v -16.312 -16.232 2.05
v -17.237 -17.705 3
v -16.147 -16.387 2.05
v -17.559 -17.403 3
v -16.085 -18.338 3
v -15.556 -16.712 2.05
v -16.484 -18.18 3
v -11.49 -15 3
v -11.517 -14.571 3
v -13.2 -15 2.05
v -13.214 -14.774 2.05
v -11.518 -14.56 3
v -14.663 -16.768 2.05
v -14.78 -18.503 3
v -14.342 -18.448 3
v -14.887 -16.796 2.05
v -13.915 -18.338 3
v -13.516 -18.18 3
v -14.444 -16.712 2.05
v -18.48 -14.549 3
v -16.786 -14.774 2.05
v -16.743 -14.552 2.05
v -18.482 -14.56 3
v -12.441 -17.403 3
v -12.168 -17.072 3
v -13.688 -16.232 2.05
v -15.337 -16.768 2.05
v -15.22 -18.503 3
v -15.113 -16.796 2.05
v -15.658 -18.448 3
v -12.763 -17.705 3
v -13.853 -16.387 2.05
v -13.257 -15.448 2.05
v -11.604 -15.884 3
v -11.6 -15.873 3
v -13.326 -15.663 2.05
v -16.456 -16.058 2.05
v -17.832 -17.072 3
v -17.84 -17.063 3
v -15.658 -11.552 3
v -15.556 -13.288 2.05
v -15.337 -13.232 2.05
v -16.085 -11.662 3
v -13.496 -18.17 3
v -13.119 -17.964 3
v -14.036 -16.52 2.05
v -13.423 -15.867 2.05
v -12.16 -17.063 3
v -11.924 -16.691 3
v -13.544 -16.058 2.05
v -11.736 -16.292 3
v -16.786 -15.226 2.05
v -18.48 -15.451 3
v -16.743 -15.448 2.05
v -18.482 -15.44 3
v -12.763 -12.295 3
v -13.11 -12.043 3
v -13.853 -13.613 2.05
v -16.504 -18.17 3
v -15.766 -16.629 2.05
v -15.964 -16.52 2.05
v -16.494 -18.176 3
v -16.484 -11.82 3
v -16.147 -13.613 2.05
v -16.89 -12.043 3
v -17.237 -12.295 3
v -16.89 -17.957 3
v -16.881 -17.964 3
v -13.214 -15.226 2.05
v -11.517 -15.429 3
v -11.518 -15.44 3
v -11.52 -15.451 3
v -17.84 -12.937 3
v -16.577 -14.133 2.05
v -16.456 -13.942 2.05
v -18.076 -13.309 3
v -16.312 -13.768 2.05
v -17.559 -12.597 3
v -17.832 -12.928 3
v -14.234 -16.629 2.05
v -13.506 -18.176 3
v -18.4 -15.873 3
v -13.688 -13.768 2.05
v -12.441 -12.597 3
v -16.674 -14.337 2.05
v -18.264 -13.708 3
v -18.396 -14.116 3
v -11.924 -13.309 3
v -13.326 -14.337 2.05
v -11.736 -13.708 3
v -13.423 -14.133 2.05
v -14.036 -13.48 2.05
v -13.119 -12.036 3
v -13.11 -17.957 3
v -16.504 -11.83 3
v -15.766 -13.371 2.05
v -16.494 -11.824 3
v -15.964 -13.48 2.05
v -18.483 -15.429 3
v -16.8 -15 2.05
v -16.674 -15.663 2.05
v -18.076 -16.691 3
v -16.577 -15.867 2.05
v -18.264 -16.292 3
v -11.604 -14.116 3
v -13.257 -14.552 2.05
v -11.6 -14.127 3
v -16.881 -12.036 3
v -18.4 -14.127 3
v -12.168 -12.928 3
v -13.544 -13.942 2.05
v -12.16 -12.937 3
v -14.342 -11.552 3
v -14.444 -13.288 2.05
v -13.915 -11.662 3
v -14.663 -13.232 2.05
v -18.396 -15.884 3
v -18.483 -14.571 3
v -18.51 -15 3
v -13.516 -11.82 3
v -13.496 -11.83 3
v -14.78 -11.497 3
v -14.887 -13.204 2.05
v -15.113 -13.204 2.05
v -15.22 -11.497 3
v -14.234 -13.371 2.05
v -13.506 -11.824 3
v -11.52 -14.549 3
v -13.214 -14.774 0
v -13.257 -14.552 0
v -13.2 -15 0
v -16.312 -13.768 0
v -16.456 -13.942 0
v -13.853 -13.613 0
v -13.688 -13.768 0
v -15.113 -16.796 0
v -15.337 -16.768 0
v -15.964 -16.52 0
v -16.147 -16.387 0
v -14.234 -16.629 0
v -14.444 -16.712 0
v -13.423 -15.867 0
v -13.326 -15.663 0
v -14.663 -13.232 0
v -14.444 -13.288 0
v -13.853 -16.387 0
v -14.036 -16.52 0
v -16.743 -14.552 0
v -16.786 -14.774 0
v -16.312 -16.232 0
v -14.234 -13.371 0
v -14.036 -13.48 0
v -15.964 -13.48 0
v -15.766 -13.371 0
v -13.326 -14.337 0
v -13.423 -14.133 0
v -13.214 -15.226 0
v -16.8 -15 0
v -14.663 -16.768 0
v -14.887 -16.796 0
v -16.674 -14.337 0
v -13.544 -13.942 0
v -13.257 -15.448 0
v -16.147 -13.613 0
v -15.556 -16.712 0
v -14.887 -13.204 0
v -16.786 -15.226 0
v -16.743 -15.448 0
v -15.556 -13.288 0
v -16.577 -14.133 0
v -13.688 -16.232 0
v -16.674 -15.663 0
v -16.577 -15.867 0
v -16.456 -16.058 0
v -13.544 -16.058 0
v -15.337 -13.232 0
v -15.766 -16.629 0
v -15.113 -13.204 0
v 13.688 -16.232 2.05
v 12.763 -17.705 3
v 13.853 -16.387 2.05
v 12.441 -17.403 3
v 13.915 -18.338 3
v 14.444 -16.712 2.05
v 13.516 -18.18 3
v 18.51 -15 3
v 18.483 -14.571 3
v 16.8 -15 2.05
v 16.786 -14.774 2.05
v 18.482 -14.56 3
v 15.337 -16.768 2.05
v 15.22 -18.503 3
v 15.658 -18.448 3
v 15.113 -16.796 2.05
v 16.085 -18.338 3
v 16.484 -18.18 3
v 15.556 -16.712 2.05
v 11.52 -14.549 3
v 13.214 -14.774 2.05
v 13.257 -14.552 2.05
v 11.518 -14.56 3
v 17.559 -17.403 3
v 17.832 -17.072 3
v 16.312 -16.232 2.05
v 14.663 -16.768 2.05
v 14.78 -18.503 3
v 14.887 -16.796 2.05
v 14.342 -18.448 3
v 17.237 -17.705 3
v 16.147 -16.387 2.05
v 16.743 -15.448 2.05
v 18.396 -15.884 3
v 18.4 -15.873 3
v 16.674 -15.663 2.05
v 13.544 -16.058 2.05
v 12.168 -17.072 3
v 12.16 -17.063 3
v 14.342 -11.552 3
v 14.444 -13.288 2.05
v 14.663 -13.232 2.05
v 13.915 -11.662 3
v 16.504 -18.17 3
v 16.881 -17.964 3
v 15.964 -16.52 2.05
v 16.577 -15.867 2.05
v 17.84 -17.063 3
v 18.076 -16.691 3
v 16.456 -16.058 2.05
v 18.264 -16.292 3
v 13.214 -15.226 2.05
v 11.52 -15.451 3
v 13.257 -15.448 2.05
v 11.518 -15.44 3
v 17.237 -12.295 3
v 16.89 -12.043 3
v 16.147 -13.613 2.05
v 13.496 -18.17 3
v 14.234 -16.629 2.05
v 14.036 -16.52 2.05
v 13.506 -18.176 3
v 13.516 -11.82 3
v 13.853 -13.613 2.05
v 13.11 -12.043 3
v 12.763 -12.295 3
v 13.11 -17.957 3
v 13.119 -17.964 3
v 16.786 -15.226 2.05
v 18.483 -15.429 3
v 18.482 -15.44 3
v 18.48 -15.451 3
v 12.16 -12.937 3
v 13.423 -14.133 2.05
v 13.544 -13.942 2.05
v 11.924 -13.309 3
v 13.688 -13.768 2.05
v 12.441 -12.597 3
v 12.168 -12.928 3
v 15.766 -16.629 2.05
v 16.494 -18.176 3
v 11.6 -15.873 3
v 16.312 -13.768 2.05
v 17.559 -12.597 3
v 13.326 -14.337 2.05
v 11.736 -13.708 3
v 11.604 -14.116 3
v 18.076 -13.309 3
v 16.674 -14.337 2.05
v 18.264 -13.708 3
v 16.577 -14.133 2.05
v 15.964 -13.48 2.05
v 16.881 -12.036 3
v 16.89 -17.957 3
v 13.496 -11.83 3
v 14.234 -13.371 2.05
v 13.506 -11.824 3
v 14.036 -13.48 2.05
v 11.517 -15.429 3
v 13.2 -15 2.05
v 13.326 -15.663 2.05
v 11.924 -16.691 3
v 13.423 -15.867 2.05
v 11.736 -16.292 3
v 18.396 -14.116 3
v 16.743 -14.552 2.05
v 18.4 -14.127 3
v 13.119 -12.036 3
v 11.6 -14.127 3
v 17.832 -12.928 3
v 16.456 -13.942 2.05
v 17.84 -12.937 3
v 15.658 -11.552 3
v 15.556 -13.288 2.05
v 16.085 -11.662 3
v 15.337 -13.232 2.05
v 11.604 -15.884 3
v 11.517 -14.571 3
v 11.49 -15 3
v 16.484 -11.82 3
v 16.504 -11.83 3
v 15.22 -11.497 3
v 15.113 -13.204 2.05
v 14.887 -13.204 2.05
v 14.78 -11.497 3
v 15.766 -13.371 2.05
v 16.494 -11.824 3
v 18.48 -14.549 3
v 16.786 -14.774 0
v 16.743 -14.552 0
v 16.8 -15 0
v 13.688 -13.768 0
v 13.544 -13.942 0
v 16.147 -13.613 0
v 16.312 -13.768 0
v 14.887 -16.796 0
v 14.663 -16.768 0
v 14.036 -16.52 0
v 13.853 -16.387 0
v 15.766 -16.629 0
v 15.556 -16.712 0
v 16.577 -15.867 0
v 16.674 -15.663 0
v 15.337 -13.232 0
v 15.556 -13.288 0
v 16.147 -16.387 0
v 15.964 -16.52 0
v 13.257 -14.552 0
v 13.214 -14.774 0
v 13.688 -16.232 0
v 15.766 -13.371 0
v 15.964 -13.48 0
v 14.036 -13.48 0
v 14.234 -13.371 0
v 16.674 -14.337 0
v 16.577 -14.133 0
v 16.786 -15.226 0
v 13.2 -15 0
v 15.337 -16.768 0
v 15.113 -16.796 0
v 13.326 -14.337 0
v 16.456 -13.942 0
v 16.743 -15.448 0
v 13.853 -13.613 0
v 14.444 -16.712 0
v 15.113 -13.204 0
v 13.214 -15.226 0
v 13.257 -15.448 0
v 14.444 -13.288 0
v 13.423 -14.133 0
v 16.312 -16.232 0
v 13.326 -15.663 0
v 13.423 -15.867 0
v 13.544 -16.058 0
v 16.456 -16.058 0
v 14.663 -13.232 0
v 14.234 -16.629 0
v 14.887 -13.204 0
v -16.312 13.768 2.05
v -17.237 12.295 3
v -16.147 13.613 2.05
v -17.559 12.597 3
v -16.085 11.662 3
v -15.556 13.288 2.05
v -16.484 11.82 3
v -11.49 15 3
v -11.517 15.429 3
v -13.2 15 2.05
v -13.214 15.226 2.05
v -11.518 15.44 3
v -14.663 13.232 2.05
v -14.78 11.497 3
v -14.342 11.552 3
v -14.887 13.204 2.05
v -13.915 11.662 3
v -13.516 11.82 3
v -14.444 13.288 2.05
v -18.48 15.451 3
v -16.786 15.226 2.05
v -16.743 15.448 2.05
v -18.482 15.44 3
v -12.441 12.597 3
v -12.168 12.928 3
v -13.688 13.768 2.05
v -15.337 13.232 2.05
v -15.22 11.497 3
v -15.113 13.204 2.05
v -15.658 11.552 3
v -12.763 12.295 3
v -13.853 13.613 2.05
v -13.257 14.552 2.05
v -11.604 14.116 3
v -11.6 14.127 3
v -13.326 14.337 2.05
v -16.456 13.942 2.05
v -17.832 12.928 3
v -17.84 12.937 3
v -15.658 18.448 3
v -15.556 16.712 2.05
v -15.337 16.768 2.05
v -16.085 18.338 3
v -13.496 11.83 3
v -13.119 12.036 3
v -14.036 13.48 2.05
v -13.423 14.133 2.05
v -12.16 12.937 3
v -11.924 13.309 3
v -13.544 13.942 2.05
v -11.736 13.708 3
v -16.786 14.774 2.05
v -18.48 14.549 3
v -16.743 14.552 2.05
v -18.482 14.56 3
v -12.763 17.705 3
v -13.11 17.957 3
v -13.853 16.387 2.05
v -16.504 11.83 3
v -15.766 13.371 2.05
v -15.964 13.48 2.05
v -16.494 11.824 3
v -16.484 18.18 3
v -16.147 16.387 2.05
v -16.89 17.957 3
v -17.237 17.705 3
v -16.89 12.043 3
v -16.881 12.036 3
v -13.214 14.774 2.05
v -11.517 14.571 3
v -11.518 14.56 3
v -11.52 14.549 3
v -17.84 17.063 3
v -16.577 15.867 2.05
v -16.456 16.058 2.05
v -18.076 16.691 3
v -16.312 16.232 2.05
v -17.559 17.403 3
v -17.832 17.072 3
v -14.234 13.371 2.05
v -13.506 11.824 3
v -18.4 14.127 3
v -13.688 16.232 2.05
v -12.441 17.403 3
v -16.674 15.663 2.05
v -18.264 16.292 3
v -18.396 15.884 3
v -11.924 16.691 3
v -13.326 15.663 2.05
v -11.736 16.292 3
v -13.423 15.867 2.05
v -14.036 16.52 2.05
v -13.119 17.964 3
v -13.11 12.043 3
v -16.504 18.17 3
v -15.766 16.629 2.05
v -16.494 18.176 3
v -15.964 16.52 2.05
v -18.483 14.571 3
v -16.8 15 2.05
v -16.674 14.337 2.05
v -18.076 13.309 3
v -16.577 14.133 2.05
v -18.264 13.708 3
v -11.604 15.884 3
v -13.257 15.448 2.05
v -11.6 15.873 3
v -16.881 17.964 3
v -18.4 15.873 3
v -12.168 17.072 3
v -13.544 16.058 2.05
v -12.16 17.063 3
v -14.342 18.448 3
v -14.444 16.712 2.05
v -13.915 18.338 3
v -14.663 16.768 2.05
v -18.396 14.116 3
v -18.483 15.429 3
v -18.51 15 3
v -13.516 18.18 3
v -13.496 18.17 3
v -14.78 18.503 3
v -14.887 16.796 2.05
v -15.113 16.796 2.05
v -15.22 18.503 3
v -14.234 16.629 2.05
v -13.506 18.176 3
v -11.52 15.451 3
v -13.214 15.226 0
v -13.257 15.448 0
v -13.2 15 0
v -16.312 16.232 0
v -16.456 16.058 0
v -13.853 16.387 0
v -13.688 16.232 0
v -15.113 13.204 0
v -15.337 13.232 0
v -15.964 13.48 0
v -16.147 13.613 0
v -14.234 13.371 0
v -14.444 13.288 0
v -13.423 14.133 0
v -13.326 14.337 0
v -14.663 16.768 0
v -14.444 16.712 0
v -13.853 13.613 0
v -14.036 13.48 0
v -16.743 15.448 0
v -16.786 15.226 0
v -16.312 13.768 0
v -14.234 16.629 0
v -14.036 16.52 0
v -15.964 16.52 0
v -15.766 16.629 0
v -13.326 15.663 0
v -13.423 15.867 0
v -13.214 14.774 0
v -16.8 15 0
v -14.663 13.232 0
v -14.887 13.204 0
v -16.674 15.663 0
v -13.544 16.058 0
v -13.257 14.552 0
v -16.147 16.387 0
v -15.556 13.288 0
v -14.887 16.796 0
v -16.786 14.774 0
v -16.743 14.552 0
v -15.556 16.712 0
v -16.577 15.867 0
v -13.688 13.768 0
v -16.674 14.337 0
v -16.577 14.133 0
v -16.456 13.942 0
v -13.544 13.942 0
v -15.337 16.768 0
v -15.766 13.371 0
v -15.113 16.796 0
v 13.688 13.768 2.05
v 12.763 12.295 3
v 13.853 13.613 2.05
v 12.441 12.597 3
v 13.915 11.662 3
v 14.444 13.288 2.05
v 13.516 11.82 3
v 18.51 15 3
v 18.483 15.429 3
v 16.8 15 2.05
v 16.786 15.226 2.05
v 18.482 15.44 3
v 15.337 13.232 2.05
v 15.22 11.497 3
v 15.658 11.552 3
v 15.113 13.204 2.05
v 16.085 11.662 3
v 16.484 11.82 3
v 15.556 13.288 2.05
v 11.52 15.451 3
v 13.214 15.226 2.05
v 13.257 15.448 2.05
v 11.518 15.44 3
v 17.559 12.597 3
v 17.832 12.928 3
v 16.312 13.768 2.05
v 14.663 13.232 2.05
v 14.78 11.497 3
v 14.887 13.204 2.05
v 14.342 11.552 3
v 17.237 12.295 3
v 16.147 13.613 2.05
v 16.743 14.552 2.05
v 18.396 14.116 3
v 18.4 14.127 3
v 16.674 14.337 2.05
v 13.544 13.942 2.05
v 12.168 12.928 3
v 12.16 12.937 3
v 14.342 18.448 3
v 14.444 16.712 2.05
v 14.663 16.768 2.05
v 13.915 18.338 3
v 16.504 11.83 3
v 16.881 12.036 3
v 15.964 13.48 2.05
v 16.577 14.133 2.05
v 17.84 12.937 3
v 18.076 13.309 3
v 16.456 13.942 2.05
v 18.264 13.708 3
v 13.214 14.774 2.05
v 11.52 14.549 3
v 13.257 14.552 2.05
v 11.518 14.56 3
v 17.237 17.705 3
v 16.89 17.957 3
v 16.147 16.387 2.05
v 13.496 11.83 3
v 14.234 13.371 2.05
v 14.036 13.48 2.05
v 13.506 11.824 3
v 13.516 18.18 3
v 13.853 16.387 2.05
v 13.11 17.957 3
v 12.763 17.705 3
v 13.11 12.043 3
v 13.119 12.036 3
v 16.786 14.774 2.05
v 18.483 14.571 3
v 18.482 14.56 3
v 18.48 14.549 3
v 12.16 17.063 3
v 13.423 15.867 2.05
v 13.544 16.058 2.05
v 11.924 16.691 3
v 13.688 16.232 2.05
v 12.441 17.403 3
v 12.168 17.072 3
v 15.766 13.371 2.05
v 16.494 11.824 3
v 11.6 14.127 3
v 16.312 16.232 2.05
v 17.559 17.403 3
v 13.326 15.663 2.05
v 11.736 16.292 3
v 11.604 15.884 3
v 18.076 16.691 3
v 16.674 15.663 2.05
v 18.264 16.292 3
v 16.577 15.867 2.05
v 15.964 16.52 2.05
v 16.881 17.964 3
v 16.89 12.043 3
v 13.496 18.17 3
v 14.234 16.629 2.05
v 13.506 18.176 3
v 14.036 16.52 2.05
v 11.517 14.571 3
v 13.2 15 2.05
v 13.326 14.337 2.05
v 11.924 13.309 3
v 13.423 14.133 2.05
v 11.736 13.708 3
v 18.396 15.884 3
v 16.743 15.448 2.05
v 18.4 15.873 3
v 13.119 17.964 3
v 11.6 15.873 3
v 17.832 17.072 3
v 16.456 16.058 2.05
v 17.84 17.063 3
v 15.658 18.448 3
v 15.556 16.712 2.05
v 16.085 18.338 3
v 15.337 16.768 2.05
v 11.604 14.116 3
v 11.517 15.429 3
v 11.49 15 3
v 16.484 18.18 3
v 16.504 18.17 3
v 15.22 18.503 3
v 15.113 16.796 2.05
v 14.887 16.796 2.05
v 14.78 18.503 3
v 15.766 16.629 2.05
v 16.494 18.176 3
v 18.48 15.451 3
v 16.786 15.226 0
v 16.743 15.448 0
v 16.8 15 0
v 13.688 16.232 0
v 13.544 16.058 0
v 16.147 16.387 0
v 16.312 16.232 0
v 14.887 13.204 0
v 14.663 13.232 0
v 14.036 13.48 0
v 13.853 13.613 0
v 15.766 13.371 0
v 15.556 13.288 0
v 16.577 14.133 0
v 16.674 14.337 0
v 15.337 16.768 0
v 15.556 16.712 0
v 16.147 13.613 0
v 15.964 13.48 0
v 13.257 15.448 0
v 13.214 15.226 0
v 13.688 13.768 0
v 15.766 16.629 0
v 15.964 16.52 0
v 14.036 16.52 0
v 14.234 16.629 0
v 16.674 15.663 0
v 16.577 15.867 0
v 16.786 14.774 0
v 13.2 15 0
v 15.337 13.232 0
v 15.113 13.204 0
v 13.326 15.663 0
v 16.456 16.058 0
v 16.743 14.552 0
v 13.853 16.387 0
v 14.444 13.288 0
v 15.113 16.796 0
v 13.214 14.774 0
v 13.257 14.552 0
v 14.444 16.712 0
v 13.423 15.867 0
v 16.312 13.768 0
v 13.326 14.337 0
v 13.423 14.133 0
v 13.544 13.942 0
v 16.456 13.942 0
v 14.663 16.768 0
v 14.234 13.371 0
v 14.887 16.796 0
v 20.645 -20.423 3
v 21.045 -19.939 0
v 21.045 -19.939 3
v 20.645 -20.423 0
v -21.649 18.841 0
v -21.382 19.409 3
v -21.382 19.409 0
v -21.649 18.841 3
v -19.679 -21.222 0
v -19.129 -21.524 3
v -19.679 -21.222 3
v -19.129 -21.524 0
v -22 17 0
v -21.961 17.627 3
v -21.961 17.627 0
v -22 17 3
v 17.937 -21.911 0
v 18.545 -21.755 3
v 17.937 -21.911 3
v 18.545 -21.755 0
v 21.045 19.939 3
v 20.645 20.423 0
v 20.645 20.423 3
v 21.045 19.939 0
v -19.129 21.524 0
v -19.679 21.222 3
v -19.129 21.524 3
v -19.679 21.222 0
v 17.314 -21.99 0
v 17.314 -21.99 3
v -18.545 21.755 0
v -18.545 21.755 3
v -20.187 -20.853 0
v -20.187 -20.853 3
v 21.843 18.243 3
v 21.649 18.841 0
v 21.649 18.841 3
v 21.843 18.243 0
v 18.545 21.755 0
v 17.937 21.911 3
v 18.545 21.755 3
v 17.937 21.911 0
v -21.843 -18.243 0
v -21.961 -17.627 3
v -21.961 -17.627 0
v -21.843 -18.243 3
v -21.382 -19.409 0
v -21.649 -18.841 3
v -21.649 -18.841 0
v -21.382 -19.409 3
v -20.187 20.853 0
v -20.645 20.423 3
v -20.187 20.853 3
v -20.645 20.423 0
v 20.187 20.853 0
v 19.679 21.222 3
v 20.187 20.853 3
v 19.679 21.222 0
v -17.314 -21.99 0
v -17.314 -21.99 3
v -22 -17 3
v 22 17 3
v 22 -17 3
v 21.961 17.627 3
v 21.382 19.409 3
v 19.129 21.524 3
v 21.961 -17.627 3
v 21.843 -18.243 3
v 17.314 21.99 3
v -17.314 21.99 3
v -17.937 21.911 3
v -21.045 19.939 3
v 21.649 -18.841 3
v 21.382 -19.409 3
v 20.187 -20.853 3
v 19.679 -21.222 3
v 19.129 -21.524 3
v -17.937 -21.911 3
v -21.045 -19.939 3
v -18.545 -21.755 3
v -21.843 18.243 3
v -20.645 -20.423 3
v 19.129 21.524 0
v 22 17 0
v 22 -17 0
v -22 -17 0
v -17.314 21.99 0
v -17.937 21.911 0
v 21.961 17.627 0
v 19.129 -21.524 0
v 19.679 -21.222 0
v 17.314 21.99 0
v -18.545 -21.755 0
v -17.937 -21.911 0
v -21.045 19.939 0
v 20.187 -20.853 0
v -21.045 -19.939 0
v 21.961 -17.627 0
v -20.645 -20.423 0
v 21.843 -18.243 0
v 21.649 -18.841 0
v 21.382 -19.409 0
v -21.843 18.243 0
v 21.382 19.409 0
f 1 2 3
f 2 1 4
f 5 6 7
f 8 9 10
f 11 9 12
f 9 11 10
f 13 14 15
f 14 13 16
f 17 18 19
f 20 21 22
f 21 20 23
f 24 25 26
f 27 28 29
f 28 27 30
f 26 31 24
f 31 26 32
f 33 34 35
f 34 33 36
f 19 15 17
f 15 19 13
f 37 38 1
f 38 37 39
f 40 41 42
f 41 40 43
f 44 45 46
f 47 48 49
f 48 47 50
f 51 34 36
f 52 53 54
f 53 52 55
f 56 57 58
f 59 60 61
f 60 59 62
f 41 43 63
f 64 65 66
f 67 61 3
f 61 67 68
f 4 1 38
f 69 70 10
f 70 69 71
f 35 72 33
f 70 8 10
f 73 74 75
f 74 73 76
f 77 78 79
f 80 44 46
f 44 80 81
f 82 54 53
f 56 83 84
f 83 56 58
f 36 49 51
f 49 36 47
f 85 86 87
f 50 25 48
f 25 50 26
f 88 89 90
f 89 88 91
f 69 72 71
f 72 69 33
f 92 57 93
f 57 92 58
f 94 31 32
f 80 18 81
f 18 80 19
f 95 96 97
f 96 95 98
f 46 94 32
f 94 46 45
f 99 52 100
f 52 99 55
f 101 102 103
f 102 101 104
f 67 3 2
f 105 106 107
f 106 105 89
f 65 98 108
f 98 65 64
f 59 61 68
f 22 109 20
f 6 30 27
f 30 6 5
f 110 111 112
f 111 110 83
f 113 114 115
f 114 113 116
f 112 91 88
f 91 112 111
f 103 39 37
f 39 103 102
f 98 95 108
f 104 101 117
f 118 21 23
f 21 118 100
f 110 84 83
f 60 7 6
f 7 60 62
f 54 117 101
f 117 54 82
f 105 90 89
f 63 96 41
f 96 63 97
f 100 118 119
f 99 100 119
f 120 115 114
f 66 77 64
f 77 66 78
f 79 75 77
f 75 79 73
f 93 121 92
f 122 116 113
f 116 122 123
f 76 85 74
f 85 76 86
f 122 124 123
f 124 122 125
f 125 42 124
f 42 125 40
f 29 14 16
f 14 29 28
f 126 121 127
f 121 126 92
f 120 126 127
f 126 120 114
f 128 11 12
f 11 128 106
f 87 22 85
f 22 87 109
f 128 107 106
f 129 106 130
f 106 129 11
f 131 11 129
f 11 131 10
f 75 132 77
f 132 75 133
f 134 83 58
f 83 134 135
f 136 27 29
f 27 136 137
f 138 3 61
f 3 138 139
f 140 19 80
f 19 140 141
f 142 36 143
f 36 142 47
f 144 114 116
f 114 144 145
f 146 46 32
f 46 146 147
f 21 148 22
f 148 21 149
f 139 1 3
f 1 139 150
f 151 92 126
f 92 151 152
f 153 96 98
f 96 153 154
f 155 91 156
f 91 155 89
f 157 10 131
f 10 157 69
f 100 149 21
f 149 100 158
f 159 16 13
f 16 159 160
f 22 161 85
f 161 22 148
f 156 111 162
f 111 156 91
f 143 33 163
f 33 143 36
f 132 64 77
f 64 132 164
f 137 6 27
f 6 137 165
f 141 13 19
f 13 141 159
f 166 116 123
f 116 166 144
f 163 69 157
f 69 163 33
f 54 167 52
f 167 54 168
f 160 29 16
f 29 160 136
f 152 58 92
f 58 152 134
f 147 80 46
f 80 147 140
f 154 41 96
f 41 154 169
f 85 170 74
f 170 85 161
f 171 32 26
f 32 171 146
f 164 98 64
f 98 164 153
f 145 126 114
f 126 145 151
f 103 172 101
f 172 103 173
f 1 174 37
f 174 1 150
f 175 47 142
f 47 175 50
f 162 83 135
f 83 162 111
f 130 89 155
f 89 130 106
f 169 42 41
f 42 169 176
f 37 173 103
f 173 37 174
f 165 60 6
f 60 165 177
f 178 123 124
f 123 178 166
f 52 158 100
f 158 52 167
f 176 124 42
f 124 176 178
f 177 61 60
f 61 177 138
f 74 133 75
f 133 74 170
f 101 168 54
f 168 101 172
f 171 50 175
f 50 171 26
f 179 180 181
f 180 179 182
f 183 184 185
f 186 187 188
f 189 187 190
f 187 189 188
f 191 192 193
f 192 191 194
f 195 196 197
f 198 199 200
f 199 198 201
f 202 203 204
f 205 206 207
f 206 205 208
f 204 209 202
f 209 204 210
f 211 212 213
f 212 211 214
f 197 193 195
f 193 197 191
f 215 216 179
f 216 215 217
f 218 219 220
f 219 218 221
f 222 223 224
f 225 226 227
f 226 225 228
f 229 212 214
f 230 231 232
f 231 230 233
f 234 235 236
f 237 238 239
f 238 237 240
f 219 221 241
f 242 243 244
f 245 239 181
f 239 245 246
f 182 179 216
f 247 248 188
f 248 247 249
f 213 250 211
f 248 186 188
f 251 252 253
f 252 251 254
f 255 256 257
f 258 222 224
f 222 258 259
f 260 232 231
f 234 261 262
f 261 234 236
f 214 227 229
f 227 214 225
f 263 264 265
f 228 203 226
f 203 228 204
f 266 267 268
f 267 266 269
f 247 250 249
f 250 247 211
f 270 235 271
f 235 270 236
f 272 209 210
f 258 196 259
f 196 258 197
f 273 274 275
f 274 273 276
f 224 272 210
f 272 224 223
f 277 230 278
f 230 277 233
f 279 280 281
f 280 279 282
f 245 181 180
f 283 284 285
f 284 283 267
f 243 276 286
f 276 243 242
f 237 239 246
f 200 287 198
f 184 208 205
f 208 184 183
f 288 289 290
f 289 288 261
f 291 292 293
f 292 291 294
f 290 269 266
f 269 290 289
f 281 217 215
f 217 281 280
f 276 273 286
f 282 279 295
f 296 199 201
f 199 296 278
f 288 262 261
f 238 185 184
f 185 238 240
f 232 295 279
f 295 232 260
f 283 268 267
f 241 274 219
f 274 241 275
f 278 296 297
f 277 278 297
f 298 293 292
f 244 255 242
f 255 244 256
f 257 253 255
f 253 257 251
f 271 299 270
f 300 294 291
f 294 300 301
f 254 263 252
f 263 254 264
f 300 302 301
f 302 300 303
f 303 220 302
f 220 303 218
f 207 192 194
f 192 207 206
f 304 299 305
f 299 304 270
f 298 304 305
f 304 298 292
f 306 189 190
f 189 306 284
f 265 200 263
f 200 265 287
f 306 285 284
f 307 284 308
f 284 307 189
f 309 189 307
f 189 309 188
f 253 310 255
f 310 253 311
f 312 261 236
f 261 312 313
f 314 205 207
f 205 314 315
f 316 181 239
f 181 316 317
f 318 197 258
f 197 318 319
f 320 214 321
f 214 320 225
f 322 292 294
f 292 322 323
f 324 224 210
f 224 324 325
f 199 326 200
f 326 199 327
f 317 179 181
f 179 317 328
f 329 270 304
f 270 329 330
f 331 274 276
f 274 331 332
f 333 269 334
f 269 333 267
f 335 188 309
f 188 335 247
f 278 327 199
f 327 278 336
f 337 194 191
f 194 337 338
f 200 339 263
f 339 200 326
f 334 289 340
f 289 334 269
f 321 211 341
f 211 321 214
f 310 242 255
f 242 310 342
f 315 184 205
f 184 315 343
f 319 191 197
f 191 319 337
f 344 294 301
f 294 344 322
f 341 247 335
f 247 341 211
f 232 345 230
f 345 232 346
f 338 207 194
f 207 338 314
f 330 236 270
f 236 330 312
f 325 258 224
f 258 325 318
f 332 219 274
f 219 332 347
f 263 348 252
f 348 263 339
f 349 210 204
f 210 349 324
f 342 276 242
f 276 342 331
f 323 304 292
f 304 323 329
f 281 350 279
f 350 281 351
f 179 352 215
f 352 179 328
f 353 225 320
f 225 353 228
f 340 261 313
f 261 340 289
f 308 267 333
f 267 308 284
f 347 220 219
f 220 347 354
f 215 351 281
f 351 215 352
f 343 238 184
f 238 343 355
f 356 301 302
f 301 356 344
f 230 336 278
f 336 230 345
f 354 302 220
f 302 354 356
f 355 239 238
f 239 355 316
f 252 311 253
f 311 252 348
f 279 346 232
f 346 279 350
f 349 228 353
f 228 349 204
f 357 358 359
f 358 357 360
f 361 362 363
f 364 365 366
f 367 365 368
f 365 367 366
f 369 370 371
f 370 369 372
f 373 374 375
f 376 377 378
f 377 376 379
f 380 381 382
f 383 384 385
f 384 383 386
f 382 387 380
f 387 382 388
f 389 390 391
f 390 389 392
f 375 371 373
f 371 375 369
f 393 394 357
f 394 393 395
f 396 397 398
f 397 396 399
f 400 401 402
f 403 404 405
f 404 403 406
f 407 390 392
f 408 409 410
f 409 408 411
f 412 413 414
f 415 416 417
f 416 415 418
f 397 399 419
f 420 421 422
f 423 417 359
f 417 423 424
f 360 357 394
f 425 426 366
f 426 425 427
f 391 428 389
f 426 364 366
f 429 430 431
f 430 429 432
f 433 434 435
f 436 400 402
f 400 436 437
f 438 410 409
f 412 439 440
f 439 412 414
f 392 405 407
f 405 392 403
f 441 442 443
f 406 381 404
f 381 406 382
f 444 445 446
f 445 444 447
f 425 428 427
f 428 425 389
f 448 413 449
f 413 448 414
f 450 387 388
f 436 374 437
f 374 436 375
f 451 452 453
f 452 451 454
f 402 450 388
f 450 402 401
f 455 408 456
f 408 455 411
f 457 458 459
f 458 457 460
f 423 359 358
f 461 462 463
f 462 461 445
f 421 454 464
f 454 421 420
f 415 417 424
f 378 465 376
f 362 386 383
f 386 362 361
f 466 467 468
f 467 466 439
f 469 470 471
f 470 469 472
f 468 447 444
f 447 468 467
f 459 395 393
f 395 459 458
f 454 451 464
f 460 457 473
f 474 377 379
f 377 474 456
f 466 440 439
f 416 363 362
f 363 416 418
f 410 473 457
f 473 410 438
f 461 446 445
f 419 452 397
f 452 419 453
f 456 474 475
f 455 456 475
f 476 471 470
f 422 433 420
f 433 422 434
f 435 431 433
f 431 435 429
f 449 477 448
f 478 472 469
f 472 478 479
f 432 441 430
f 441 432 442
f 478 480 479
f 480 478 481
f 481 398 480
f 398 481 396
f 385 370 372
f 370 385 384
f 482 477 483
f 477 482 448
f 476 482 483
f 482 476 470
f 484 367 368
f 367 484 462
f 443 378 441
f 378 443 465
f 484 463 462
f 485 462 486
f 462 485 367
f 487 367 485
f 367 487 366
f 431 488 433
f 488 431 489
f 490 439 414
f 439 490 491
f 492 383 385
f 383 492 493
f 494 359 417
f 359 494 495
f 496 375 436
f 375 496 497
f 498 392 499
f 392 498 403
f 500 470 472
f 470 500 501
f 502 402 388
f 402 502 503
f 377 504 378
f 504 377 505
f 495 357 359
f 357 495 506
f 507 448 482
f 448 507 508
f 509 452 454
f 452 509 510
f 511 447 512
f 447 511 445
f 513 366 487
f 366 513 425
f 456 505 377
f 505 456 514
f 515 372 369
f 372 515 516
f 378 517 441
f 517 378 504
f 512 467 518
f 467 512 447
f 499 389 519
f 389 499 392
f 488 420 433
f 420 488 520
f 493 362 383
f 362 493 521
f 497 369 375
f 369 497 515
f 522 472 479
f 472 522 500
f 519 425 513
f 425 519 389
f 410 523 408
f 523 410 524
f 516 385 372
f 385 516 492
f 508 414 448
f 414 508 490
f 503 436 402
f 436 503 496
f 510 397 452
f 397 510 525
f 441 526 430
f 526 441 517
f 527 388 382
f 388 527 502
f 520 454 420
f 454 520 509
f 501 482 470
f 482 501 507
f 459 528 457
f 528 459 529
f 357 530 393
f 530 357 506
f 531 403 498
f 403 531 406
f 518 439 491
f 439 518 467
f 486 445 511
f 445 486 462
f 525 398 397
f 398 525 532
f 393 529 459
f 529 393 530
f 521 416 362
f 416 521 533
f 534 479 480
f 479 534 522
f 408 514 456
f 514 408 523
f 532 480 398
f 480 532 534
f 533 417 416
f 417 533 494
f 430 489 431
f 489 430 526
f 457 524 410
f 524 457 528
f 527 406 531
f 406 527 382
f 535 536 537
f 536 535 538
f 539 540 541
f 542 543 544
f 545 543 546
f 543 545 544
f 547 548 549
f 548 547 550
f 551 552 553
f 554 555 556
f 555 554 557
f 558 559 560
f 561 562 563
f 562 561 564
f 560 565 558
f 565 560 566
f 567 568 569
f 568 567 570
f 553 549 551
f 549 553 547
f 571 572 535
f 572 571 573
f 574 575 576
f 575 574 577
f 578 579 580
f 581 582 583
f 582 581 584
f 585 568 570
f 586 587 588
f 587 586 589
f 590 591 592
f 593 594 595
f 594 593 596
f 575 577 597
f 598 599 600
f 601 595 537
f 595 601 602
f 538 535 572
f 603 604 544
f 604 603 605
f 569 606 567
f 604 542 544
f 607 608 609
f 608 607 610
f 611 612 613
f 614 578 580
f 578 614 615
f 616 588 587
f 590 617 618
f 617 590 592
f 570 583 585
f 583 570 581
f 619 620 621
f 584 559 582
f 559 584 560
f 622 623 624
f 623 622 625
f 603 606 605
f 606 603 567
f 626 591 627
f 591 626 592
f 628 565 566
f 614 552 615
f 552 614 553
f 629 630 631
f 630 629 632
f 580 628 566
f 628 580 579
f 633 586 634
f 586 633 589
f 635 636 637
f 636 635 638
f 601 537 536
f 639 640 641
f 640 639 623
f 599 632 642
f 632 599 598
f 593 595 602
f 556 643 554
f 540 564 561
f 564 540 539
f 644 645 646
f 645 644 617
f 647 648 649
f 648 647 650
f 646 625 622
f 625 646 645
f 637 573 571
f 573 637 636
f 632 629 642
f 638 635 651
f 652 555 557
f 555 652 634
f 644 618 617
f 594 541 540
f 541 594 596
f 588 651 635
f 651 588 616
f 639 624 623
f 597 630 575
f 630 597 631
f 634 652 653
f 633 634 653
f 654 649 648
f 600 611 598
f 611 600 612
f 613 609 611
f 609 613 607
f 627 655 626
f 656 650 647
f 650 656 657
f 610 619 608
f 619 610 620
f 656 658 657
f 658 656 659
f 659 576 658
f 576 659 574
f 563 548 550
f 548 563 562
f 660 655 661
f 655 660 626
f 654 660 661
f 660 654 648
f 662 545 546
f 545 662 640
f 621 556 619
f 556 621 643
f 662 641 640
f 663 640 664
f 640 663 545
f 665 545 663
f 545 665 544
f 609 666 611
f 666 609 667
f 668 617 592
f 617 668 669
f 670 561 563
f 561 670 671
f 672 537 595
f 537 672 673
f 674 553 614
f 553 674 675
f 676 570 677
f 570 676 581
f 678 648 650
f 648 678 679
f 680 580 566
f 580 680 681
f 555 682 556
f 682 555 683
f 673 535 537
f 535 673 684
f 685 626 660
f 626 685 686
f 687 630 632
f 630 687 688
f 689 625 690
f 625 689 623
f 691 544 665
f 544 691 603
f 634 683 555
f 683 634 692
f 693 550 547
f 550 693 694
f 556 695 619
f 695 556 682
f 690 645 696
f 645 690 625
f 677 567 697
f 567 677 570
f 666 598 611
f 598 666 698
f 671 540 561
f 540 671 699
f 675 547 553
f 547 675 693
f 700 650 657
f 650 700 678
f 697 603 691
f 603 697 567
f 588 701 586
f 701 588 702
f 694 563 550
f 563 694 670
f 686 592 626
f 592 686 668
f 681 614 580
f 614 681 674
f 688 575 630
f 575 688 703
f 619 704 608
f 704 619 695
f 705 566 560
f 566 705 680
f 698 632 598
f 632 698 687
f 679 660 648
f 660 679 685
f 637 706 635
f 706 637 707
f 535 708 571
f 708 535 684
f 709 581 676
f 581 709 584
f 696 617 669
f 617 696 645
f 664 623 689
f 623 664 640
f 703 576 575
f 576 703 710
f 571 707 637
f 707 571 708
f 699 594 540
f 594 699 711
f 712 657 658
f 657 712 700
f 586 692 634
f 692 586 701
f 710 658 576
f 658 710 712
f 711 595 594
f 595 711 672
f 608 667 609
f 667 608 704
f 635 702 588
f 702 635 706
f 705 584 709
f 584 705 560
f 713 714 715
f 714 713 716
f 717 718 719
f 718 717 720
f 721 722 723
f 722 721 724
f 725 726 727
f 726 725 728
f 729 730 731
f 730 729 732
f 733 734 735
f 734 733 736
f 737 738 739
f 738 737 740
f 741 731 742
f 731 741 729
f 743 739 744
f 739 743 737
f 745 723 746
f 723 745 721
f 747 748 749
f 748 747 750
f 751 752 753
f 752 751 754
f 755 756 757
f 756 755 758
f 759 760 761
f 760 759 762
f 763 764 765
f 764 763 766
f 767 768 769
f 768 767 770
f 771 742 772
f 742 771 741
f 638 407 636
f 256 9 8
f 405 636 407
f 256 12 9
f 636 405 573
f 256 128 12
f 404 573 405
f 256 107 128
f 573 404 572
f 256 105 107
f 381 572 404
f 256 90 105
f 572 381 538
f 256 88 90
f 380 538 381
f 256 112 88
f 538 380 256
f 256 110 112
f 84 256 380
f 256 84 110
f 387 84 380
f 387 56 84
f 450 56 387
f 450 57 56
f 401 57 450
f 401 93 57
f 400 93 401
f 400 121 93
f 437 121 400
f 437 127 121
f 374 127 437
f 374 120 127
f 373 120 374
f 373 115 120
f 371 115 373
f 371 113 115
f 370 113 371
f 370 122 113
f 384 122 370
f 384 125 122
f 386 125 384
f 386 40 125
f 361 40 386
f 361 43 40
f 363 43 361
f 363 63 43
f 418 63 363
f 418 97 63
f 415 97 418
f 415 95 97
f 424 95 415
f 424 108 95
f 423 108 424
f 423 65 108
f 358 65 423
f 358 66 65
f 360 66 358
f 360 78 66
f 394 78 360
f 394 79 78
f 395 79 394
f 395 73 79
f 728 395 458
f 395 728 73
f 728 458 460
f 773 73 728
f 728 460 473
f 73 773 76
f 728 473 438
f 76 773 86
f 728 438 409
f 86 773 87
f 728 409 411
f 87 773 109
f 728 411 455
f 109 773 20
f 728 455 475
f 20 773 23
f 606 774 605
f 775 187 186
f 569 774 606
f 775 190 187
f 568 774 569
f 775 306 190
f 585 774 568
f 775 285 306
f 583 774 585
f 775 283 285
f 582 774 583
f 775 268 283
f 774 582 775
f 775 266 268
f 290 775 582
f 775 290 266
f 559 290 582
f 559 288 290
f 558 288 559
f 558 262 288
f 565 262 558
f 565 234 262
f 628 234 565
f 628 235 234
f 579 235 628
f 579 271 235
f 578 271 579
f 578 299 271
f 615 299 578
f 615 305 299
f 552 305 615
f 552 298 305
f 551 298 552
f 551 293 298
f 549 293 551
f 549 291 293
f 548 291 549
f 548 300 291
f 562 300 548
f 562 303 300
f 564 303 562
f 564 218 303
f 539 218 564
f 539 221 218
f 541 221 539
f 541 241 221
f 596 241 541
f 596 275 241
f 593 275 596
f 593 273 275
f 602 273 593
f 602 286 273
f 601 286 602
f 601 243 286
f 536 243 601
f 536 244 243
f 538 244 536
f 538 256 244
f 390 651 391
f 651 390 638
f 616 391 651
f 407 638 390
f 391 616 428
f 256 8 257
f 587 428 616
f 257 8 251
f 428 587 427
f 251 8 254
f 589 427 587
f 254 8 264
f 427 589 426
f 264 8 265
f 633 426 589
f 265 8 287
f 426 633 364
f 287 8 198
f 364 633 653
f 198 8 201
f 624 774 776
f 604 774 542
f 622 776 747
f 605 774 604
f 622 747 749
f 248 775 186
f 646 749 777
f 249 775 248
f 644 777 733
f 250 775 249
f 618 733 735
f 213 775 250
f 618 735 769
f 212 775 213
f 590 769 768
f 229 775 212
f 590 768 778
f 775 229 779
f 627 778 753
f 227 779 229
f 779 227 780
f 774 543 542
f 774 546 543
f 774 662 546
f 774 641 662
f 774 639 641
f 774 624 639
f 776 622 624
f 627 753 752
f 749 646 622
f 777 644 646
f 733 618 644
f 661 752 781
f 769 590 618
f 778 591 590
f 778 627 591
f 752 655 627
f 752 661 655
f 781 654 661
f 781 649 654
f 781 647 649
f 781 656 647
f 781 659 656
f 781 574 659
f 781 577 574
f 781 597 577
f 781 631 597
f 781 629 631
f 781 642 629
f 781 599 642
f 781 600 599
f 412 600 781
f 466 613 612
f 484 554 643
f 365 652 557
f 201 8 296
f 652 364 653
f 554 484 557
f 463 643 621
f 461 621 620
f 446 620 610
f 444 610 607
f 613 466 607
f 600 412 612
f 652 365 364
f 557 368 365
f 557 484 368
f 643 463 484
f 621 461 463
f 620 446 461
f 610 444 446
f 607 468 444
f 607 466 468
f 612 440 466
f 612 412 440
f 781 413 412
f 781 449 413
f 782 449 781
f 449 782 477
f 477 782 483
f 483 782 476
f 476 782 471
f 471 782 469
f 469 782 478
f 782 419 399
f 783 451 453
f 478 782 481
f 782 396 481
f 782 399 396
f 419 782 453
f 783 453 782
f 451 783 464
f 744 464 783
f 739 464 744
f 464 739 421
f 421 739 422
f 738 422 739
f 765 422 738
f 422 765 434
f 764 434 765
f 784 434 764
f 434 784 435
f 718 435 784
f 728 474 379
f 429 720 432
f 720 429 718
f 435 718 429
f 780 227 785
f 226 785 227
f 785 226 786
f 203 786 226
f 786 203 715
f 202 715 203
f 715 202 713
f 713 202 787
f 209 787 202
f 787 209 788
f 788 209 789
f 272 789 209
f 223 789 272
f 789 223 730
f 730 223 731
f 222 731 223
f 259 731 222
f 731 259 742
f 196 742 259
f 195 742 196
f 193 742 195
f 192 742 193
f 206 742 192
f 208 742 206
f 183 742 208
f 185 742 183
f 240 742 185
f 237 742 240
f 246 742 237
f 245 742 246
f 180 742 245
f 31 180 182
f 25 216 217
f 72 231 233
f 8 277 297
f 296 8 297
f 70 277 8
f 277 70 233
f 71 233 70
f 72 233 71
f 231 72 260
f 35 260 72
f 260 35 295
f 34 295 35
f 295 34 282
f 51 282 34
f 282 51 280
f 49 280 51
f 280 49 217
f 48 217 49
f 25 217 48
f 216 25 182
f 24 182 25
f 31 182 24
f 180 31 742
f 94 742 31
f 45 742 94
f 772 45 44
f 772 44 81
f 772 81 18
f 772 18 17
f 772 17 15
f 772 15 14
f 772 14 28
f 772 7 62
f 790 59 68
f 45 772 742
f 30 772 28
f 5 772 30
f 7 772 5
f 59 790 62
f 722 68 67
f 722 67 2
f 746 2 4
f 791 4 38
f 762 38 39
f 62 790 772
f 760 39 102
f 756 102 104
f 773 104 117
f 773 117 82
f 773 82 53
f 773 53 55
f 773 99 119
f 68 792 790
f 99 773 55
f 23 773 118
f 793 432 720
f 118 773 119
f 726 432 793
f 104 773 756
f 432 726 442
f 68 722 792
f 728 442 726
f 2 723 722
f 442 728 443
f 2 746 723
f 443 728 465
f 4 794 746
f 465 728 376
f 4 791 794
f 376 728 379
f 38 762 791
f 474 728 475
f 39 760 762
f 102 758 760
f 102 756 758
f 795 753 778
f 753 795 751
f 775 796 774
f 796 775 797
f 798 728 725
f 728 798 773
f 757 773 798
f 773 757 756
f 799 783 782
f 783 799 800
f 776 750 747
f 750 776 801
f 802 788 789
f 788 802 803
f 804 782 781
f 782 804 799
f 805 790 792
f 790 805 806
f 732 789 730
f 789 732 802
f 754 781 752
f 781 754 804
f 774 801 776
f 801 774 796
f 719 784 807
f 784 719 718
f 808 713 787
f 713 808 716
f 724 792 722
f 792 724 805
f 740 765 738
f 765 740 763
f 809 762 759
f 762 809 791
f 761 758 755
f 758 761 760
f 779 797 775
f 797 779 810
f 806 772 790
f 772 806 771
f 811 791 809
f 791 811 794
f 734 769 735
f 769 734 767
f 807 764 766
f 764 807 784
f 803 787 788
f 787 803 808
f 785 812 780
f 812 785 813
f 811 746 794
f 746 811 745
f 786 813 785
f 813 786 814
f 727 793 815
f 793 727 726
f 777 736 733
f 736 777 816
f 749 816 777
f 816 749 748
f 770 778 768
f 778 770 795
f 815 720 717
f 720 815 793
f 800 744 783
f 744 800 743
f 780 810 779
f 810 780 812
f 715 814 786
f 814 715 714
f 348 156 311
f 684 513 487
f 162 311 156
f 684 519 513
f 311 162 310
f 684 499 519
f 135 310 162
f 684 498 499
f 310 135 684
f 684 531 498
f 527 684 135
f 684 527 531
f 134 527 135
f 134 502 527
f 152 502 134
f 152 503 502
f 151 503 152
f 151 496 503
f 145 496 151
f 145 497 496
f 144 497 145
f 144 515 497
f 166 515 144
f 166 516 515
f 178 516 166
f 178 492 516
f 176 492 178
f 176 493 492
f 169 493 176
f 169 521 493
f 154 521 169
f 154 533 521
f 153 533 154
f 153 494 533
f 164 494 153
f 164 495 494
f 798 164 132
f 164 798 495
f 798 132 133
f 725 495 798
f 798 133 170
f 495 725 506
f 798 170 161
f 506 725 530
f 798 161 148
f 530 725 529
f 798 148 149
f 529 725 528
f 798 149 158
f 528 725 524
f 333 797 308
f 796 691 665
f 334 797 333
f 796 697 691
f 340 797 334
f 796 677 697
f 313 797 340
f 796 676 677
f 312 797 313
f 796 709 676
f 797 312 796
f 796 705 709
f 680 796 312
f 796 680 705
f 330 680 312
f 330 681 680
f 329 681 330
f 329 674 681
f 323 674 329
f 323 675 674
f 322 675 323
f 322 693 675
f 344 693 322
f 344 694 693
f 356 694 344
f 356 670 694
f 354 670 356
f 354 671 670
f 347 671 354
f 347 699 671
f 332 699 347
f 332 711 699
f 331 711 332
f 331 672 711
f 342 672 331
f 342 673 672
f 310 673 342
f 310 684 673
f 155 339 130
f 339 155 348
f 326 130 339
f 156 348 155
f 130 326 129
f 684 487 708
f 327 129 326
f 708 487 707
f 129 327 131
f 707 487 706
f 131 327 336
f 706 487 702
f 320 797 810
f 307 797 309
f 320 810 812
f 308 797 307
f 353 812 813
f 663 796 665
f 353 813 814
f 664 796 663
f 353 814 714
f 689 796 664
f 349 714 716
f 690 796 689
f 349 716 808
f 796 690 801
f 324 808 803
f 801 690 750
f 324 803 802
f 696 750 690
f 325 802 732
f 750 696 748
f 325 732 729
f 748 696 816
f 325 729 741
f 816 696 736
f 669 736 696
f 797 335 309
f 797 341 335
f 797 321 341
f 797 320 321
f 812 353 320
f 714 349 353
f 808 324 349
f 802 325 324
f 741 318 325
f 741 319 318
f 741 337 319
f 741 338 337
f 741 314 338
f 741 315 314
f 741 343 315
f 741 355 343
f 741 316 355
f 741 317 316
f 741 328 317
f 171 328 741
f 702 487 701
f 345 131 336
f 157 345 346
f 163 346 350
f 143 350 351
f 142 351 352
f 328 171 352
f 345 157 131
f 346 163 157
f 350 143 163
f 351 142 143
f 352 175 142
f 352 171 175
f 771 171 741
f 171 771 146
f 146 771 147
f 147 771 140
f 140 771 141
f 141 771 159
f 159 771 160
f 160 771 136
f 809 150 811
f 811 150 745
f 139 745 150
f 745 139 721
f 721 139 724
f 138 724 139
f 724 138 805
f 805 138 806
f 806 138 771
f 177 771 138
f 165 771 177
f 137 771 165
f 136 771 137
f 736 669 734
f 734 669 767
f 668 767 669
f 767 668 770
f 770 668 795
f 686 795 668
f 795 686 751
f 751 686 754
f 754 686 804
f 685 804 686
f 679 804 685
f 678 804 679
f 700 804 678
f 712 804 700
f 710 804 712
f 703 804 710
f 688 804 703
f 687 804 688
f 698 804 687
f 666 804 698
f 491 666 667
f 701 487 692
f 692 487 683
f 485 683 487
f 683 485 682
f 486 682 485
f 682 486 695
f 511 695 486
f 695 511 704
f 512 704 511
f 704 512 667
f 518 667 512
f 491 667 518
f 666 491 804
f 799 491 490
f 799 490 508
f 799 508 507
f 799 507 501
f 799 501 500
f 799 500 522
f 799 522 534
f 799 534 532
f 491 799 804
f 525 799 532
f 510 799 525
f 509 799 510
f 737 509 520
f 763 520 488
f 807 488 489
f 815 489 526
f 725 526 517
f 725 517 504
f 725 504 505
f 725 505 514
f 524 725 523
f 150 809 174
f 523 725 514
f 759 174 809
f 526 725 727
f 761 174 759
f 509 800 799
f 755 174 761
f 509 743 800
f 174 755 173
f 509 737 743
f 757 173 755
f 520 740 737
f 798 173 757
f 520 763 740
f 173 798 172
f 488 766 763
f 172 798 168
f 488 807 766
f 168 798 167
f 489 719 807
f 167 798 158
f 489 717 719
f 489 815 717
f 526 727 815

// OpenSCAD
$fn = 50;


difference() {
	union() {
		hull() {
			translate(v = [-17.0000000000, 17.0000000000, 0]) {
				cylinder(h = 3, r = 5);
			}
			translate(v = [17.0000000000, 17.0000000000, 0]) {
				cylinder(h = 3, r = 5);
			}
			translate(v = [-17.0000000000, -17.0000000000, 0]) {
				cylinder(h = 3, r = 5);
			}
			translate(v = [17.0000000000, -17.0000000000, 0]) {
				cylinder(h = 3, r = 5);
			}
		}
	}
	union() {
		translate(v = [-15.0000000000, -15.0000000000, 3]) {
			rotate(a = [0, 0, 0]) {
				difference() {
					union() {
						translate(v = [0, 0, -6.0000000000]) {
							cylinder(h = 6, r = 1.5000000000);
						}
						translate(v = [0, 0, -0.9500000000]) {
							cylinder(r1 = 1.8000000000, r2 = 3.6000000000);
						}
						translate(v = [0, 0, -6.0000000000]) {
							cylinder(h = 6, r = 1.8000000000);
						}
						translate(v = [0, 0, -6.0000000000]) {
							cylinder(h = 6, r = 1.5000000000);
						}
					}
					union();
				}
			}
		}
		translate(v = [15.0000000000, -15.0000000000, 3]) {
			rotate(a = [0, 0, 0]) {
				difference() {
					union() {
						translate(v = [0, 0, -6.0000000000]) {
							cylinder(h = 6, r = 1.5000000000);
						}
						translate(v = [0, 0, -0.9500000000]) {
							cylinder(r1 = 1.8000000000, r2 = 3.6000000000);
						}
						translate(v = [0, 0, -6.0000000000]) {
							cylinder(h = 6, r = 1.8000000000);
						}
						translate(v = [0, 0, -6.0000000000]) {
							cylinder(h = 6, r = 1.5000000000);
						}
					}
					union();
				}
			}
		}
		translate(v = [-15.0000000000, 15.0000000000, 3]) {
			rotate(a = [0, 0, 0]) {
				difference() {
					union() {
						translate(v = [0, 0, -6.0000000000]) {
							cylinder(h = 6, r = 1.5000000000);
						}
						translate(v = [0, 0, -0.9500000000]) {
							cylinder(r1 = 1.8000000000, r2 = 3.6000000000);
						}
						translate(v = [0, 0, -6.0000000000]) {
							cylinder(h = 6, r = 1.8000000000);
						}
						translate(v = [0, 0, -6.0000000000]) {
							cylinder(h = 6, r = 1.5000000000);
						}
					}
					union();
				}
			}
		}
		translate(v = [15.0000000000, 15.0000000000, 3]) {
			rotate(a = [0, 0, 0]) {
				difference() {
					union() {
						translate(v = [0, 0, -6.0000000000]) {
							cylinder(h = 6, r = 1.5000000000);
						}
						translate(v = [0, 0, -0.9500000000]) {
							cylinder(r1 = 1.8000000000, r2 = 3.6000000000);
						}
						translate(v = [0, 0, -6.0000000000]) {
							cylinder(h = 6, r = 1.8000000000);
						}
						translate(v = [0, 0, -6.0000000000]) {
							cylinder(h = 6, r = 1.5000000000);
						}
					}
					union();
				}
			}
		}
		translate(v = [0, 0, 3]) {
			hull() {
				union() {
					translate(v = [-17.0000000000, 17.0000000000, 4]) {
						cylinder(h = 36, r = 4);
					}
					translate(v = [-17.0000000000, 17.0000000000, 4]) {
						sphere(r = 4);
					}
					translate(v = [-17.0000000000, 17.0000000000, 40]) {
						sphere(r = 4);
					}
				}
				union() {
					translate(v = [17.0000000000, 17.0000000000, 4]) {
						cylinder(h = 36, r = 4);
					}
					translate(v = [17.0000000000, 17.0000000000, 4]) {
						sphere(r = 4);
					}
					translate(v = [17.0000000000, 17.0000000000, 40]) {
						sphere(r = 4);
					}
				}
				union() {
					translate(v = [-17.0000000000, -17.0000000000, 4]) {
						cylinder(h = 36, r = 4);
					}
					translate(v = [-17.0000000000, -17.0000000000, 4]) {
						sphere(r = 4);
					}
					translate(v = [-17.0000000000, -17.0000000000, 40]) {
						sphere(r = 4);
					}
				}
				union() {
					translate(v = [17.0000000000, -17.0000000000, 4]) {
						cylinder(h = 36, r = 4);
					}
					translate(v = [17.0000000000, -17.0000000000, 4]) {
						sphere(r = 4);
					}
					translate(v = [17.0000000000, -17.0000000000, 40]) {
						sphere(r = 4);
					}
				}
			}
		}
	}
}
